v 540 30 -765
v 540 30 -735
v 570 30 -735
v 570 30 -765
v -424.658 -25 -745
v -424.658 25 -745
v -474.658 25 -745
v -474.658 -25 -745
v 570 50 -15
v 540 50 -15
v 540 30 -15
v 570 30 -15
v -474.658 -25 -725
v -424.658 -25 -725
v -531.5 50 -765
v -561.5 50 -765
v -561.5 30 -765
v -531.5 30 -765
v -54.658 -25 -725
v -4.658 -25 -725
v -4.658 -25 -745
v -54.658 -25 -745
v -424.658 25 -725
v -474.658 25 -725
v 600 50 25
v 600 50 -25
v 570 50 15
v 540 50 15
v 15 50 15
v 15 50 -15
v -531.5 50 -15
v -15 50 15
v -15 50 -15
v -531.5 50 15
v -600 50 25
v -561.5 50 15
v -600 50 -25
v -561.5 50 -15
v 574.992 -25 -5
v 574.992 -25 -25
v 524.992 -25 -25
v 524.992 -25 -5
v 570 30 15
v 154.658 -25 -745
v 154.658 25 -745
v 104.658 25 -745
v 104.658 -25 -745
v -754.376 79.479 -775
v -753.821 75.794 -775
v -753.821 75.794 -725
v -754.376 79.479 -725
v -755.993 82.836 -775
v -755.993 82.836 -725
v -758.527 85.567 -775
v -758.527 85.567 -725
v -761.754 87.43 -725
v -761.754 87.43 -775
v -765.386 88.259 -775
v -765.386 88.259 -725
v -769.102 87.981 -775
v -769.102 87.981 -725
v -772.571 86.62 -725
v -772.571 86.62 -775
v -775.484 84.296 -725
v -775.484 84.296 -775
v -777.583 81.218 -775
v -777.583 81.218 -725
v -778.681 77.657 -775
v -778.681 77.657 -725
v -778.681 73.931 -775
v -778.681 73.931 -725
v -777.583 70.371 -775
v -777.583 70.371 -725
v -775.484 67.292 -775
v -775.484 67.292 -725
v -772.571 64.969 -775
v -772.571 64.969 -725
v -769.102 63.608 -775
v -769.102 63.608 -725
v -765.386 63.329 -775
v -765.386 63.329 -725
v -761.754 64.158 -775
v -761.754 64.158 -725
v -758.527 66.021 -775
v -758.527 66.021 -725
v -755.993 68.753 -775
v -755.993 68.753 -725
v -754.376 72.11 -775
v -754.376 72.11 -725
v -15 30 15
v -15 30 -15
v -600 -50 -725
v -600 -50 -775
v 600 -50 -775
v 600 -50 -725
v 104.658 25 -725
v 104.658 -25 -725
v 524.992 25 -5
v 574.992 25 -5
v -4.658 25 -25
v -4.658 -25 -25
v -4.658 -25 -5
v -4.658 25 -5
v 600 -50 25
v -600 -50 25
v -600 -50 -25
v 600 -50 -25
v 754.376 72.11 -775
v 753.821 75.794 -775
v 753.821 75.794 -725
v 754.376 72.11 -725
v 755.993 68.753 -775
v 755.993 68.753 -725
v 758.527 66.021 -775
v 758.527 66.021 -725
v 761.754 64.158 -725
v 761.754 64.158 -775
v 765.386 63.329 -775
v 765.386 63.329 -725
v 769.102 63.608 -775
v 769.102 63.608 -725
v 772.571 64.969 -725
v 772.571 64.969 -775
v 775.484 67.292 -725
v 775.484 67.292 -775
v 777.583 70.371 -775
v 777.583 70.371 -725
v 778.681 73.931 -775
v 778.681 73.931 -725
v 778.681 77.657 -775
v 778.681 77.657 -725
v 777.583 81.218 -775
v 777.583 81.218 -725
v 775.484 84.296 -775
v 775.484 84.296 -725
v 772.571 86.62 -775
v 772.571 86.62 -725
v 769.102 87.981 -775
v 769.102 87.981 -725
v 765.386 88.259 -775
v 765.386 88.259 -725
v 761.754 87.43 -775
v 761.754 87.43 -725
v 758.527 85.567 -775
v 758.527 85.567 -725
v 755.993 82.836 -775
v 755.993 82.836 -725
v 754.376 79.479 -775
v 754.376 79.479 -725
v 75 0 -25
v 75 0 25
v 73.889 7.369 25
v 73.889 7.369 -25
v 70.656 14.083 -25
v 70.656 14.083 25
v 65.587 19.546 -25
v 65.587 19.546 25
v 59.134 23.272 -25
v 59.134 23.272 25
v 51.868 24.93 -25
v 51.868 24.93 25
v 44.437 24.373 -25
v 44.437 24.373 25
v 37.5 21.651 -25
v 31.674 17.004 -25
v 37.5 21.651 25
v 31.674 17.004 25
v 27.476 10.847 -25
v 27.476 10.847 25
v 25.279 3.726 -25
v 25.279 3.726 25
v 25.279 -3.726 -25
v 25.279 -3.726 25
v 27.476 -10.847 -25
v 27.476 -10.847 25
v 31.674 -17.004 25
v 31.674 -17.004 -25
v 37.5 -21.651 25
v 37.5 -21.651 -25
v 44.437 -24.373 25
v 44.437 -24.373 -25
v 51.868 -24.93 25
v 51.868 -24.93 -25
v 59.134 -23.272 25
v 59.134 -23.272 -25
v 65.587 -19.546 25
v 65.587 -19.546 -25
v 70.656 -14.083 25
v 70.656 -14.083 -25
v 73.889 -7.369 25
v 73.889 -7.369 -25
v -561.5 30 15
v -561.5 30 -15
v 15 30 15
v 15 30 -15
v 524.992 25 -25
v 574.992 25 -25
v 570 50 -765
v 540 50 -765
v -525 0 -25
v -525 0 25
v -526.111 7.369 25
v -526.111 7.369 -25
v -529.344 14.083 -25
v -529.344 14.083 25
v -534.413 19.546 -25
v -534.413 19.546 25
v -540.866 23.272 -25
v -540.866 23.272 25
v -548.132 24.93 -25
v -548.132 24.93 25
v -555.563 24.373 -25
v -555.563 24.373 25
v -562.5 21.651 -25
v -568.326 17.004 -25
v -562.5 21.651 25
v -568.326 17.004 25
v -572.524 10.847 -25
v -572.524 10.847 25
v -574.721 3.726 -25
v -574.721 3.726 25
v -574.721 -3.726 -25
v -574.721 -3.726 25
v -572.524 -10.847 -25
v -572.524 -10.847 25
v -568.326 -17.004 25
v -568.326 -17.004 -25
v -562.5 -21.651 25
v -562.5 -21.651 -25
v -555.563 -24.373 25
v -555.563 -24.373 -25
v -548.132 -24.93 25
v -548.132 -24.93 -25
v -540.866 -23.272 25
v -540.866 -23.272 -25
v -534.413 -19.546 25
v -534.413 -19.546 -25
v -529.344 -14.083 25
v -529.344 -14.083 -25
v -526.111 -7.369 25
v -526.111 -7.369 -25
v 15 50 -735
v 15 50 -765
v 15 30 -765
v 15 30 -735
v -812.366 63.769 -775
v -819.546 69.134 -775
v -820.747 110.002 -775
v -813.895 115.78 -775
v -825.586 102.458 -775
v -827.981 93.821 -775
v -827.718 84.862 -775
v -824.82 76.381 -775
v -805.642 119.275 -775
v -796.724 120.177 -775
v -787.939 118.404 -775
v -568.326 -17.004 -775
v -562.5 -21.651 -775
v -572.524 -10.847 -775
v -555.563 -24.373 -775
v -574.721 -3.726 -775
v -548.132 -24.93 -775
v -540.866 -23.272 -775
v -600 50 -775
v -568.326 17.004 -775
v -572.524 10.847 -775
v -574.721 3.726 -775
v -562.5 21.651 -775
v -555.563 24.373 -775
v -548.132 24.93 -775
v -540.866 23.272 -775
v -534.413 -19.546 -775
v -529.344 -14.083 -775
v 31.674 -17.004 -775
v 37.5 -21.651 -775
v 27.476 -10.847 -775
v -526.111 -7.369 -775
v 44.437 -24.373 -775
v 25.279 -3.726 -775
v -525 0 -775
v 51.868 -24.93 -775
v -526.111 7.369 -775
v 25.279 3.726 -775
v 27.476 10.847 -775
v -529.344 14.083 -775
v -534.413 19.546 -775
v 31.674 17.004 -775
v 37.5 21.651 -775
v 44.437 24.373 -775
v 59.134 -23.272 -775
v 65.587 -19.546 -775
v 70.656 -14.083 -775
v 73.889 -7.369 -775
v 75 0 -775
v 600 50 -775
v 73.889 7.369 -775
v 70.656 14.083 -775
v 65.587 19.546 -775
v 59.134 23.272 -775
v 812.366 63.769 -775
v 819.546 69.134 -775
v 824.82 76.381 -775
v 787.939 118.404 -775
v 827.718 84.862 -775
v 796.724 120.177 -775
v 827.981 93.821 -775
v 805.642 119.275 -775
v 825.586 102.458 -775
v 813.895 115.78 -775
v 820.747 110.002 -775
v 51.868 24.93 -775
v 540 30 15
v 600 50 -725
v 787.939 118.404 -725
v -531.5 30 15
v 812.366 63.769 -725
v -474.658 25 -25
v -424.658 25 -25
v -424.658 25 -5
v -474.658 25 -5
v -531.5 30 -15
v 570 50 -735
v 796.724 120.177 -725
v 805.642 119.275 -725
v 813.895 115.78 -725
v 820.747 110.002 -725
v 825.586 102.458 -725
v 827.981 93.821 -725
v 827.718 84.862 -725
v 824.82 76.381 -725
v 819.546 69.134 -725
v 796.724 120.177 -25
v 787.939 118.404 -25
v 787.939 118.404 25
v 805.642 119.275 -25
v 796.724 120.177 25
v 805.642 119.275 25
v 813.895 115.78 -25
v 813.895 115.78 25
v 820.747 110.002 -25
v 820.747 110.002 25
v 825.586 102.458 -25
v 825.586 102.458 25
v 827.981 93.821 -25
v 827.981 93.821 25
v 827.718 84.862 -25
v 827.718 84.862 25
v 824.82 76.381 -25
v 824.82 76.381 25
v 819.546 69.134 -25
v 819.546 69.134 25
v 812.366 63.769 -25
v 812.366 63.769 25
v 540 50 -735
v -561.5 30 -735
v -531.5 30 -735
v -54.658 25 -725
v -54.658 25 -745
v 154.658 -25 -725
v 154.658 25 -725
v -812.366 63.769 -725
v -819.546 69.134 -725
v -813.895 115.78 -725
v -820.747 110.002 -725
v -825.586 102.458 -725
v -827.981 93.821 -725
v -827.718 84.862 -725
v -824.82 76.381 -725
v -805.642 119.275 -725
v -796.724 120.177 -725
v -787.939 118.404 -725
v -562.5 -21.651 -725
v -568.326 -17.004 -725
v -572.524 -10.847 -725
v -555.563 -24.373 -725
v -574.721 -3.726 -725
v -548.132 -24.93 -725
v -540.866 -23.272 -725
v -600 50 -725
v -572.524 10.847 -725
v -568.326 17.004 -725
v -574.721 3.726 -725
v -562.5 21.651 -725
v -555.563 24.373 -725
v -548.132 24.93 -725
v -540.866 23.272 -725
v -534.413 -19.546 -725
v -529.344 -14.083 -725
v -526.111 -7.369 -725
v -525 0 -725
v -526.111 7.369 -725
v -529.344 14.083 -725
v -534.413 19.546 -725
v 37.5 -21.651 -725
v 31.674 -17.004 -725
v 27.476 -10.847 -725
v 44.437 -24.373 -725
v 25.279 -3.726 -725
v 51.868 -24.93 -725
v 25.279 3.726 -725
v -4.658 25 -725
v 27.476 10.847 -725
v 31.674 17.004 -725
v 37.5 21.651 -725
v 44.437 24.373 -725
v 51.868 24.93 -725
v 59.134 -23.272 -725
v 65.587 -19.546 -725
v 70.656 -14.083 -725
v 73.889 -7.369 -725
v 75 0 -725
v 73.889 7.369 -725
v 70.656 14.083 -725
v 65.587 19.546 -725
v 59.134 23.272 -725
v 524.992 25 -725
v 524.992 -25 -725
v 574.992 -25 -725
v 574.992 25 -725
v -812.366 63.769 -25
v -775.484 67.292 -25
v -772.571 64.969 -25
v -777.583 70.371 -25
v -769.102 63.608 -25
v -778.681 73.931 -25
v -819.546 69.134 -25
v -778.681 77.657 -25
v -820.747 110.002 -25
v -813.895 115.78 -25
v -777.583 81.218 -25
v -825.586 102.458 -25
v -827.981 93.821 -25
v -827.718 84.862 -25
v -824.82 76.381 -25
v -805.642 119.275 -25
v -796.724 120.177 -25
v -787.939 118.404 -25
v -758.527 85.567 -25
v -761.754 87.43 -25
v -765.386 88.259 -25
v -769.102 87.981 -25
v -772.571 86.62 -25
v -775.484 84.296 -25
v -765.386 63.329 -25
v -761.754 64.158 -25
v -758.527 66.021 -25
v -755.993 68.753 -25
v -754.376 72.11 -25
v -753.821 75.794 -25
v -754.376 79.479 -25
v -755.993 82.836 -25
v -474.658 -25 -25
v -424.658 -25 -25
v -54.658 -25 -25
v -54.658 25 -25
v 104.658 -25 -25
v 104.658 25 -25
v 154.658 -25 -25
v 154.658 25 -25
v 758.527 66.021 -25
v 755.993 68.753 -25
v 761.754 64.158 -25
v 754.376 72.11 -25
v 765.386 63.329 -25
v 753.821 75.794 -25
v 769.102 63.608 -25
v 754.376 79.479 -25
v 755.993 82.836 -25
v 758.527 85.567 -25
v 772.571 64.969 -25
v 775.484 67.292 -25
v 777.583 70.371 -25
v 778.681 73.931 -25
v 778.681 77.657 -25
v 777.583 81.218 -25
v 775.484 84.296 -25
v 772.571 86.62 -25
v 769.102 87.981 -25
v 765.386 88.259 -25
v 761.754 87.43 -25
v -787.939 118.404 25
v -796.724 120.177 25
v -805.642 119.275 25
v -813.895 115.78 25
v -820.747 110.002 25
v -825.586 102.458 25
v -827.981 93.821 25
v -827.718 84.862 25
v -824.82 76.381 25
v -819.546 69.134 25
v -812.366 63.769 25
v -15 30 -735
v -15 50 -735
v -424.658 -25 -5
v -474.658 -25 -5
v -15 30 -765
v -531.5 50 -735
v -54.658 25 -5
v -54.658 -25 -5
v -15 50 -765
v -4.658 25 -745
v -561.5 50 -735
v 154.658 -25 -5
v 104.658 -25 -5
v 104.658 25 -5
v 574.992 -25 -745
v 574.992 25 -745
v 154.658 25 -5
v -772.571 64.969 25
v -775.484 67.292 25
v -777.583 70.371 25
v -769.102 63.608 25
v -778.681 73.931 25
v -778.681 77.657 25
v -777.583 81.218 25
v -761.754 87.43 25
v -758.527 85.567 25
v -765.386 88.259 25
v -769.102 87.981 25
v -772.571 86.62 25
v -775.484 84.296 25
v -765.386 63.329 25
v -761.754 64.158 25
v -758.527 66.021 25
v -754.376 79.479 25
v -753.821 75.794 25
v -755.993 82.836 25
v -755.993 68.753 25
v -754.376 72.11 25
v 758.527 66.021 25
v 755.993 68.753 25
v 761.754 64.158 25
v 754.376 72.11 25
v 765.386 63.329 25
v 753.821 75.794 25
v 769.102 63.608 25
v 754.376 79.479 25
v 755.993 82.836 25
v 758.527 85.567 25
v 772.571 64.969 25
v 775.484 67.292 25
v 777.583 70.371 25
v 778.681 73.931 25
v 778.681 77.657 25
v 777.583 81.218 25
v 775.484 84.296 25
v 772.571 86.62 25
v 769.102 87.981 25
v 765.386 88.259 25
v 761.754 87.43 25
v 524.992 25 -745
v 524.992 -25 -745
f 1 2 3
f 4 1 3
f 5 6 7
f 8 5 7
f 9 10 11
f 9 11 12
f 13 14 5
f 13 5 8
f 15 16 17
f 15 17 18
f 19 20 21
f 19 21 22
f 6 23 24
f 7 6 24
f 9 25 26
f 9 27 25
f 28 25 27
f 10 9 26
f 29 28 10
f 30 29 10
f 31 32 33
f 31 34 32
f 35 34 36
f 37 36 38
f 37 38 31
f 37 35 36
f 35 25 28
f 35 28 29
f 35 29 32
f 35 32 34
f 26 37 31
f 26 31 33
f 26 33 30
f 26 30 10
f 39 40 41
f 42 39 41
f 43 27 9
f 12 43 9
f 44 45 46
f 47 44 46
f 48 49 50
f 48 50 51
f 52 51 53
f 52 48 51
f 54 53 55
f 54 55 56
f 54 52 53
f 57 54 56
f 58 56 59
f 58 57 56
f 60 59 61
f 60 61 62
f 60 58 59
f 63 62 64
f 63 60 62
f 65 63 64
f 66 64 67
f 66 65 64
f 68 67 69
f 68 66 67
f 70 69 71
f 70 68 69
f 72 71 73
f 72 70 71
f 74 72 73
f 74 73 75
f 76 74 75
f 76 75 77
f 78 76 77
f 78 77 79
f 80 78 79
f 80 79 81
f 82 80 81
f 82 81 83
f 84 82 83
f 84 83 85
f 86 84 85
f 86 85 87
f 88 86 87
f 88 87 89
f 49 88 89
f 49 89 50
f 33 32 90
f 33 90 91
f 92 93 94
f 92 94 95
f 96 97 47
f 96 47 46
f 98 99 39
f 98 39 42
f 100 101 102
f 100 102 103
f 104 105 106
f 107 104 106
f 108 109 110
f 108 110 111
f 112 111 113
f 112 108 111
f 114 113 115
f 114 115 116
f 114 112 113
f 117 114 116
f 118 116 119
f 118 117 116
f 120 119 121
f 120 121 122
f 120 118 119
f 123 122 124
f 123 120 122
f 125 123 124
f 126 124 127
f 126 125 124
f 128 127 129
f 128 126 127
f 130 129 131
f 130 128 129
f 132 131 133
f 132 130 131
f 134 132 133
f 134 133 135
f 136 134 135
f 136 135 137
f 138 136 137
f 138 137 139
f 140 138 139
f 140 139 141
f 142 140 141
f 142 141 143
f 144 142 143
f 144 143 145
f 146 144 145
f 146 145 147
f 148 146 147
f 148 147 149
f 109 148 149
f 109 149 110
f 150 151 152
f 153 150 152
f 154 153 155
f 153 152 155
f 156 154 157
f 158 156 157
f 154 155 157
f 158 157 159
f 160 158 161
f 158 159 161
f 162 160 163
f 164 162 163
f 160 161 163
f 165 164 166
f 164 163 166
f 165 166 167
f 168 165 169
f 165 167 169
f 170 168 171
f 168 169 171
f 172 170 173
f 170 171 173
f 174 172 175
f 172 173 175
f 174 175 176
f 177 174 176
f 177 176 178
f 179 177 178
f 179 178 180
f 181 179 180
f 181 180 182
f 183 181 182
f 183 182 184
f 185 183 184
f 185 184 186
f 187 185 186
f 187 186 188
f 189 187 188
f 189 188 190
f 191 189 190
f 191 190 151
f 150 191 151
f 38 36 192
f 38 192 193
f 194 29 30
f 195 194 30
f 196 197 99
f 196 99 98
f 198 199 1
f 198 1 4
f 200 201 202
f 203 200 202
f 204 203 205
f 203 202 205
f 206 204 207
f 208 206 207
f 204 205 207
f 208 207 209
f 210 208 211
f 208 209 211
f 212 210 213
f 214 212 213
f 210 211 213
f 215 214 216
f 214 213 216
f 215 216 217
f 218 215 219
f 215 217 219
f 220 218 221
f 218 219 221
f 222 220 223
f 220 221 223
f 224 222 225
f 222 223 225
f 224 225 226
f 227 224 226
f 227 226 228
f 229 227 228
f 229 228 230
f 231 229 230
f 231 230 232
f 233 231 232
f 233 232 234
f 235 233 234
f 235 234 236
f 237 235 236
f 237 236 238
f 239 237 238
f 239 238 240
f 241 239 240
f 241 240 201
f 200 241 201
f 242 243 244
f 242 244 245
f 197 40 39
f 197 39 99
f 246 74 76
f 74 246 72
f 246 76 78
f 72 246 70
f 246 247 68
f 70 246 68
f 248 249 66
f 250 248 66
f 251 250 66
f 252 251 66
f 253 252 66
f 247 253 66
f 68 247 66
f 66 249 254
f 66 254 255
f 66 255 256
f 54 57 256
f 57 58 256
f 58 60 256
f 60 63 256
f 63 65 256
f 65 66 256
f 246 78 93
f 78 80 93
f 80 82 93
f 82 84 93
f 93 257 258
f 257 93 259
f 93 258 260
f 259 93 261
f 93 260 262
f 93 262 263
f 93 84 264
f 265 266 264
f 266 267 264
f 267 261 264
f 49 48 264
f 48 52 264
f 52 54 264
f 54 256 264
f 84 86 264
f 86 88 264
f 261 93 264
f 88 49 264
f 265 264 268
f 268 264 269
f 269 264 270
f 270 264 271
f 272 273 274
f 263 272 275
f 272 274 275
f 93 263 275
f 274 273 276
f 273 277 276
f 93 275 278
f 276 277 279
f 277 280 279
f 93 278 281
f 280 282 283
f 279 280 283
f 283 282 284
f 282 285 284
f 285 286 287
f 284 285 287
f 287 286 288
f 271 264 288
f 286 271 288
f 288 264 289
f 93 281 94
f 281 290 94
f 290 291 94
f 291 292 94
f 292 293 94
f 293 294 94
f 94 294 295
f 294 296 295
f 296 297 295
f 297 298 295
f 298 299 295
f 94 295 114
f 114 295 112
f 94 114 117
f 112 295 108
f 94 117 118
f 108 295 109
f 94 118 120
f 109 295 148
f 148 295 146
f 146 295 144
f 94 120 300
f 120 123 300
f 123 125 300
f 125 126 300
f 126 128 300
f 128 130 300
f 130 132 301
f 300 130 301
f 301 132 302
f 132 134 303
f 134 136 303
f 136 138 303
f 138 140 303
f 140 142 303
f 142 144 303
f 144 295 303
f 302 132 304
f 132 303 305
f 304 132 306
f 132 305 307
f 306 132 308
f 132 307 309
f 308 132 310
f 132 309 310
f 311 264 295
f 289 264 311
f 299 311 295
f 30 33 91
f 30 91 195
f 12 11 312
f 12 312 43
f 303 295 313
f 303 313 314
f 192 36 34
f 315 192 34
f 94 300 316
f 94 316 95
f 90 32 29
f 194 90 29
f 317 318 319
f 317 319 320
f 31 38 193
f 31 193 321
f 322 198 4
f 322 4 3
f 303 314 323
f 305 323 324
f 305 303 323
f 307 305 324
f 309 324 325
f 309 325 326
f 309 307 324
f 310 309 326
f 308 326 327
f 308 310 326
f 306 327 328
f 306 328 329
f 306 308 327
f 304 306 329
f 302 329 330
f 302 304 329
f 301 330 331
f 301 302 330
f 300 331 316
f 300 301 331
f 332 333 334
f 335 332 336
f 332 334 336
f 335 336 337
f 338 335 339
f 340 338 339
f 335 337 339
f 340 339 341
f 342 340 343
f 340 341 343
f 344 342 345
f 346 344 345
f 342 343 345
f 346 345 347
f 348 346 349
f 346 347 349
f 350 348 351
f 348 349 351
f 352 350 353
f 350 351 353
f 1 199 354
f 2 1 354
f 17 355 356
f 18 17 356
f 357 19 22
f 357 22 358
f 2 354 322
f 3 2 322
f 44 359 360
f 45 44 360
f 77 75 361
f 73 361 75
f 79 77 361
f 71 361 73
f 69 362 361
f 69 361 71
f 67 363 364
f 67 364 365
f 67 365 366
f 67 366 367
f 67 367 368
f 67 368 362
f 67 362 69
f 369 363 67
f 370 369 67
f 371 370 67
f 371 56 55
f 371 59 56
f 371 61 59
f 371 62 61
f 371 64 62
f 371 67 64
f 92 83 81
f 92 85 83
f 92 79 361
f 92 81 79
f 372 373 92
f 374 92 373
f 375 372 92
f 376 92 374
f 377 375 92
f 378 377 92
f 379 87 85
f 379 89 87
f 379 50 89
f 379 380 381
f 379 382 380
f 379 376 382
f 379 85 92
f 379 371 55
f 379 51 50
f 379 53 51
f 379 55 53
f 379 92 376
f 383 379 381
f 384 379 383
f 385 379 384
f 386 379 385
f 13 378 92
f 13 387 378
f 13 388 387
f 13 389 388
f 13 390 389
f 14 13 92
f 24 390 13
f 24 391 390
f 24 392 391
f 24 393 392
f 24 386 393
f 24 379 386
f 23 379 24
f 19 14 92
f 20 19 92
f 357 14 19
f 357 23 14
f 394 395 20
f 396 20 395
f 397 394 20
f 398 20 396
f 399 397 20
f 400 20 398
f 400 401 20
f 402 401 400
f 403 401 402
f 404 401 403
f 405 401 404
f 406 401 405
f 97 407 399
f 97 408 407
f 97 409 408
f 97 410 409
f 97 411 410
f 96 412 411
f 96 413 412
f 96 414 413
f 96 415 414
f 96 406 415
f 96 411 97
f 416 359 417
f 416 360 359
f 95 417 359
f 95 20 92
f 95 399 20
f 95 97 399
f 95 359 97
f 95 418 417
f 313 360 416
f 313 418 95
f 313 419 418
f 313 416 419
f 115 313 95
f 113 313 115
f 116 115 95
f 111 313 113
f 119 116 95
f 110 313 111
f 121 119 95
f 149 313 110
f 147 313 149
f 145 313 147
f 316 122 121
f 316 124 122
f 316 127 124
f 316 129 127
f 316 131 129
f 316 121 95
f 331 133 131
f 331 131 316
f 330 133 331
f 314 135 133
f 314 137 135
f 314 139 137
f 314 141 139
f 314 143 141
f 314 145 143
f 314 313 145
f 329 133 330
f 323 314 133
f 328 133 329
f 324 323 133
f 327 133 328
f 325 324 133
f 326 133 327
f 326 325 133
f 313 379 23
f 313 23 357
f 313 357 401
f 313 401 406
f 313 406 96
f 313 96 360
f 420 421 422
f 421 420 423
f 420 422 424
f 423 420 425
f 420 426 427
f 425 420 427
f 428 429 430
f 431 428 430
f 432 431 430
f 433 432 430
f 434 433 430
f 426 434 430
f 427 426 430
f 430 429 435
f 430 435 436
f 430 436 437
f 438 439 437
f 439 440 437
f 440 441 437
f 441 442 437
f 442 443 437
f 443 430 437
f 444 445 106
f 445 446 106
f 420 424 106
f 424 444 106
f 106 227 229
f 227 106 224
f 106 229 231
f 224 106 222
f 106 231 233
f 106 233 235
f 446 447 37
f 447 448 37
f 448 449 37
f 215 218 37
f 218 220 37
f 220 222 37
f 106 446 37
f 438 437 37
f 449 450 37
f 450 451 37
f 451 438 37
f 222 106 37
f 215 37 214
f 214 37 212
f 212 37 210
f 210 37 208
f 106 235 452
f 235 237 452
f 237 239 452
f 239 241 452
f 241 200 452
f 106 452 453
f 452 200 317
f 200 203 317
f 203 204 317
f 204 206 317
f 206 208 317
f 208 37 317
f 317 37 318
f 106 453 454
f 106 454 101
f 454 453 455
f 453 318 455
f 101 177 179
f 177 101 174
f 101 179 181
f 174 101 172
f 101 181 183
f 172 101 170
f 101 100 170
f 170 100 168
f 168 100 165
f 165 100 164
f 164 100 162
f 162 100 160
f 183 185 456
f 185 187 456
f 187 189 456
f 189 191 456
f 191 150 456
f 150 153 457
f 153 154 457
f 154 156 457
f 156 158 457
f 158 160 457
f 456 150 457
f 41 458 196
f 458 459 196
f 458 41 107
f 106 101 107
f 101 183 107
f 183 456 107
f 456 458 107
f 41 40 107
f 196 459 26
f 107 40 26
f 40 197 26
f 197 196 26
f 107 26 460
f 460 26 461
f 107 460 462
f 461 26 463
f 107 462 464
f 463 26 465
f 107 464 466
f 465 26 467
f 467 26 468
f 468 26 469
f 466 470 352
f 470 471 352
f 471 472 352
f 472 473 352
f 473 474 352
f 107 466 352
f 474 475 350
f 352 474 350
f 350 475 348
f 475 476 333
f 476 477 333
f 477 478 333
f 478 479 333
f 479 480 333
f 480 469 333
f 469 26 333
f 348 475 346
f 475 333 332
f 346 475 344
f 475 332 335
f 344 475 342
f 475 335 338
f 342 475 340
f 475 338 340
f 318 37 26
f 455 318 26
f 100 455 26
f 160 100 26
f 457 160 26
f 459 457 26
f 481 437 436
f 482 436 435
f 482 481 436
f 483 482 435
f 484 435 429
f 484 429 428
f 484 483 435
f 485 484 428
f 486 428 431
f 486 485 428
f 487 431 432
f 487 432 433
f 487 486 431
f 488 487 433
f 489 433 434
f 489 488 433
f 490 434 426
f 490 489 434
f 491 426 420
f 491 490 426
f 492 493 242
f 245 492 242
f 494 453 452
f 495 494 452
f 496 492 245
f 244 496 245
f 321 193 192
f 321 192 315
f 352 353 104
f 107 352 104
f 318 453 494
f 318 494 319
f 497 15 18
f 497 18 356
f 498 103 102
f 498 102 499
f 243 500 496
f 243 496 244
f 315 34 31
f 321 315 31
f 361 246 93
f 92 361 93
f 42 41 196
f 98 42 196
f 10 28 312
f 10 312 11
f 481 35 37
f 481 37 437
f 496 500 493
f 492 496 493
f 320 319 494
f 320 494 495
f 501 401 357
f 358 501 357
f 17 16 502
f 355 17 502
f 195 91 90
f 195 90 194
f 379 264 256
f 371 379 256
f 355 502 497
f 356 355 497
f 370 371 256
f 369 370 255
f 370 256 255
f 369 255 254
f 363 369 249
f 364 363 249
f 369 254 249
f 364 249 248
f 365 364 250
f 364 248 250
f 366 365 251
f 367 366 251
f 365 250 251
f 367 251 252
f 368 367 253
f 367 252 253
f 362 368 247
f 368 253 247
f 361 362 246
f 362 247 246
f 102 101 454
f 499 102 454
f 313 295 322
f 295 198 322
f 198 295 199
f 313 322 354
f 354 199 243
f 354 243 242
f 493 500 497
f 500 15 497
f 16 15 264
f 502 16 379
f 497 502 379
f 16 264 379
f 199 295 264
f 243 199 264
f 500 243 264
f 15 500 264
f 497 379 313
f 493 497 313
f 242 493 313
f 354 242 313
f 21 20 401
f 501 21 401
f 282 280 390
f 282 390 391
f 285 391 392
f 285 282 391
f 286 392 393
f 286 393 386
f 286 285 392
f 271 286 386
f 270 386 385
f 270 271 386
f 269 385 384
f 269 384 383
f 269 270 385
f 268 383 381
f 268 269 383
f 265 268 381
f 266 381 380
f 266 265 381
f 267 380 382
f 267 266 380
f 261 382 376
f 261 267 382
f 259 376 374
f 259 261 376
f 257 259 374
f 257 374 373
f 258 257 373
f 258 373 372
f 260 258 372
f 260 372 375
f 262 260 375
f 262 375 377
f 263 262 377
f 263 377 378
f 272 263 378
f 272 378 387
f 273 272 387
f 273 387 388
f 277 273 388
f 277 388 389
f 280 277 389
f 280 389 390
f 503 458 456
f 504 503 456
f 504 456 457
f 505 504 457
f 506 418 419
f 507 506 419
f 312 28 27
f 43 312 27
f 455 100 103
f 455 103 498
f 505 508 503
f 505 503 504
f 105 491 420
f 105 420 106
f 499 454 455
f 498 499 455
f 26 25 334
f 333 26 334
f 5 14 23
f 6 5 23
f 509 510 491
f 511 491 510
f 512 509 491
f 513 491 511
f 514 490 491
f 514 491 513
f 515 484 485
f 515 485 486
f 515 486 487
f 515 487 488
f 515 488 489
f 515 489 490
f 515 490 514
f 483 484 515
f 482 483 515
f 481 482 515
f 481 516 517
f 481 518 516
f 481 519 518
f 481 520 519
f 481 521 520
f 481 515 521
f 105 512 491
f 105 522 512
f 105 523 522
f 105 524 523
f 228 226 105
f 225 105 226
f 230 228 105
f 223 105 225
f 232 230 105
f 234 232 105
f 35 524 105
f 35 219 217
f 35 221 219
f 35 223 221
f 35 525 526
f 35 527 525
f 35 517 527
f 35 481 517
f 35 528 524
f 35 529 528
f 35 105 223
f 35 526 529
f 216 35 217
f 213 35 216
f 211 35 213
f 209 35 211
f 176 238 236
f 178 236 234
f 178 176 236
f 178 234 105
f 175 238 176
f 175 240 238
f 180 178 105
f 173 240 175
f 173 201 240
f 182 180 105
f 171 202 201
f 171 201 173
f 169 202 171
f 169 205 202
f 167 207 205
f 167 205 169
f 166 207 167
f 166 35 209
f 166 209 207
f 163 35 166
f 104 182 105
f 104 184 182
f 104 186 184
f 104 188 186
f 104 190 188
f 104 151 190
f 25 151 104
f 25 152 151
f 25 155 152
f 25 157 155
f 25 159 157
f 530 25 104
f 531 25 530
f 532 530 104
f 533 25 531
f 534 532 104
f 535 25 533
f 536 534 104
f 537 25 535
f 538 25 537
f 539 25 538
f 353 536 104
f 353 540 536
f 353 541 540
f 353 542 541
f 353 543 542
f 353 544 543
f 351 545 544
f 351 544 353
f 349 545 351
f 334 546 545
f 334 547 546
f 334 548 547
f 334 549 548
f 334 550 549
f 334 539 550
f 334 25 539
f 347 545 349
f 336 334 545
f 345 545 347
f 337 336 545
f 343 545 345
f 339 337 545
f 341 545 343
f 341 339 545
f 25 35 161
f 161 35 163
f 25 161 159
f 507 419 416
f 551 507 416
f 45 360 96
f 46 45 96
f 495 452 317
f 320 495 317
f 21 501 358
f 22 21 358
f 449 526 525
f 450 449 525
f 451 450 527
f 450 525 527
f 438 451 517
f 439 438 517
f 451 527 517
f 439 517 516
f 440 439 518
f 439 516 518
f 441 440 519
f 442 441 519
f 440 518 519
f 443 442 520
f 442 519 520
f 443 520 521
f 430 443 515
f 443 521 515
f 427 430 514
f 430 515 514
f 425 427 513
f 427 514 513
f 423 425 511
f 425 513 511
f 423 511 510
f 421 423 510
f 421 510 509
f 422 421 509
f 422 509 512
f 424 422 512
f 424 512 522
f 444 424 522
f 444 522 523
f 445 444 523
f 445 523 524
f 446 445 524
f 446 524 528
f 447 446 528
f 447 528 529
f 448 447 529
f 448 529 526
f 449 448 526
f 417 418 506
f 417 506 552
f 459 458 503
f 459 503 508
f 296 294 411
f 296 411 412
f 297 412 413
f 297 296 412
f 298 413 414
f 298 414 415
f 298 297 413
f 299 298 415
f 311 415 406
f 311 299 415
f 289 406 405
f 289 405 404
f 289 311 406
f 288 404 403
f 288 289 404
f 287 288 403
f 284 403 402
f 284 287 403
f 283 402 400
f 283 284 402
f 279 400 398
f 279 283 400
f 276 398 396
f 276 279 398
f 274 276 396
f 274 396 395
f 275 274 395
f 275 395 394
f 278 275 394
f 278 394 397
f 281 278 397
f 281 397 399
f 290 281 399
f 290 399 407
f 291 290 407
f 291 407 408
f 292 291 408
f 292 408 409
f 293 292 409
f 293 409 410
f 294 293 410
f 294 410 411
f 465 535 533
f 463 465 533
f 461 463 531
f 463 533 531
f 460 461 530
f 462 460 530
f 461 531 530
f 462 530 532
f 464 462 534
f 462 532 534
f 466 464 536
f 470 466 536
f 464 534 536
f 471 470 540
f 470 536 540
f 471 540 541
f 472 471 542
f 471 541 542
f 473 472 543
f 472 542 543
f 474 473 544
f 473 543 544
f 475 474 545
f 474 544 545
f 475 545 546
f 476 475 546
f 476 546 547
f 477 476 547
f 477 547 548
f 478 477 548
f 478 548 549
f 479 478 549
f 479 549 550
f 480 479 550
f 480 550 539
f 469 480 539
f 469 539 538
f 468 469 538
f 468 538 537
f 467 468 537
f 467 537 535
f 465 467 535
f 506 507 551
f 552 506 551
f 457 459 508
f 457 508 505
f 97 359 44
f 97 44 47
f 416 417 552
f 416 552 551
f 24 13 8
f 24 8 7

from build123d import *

# Parameters (mm, degrees)
BOSS_EXTRUDE3_DEPTH      = 600
BOSS_EXTRUDE3_DEPTH_BACK = 600
SKETCH1_W                = 50
SKETCH1_H                = 100
BOSS_EXTRUDE4_DEPTH      = 50
SKETCH4_R                = 25
SKETCH4_R_2              = 12.5
CUT_EXTRUDE1_DEPTH       = 839.37045622
SKETCH5_W                = 50
SKETCH5_H                = 50
CUT_EXTRUDE2_DEPTH       = 20
SKETCH7_W                = 30
SKETCH7_H                = 30
CUT_EXTRUDE3_DEPTH       = 20


with BuildPart() as part:
    # Sketch1 → Boss-Extrude3 (new, two sides: drawn at the far end of the back side and taken through both)
    with BuildSketch(Plane(origin=(0, 0, 0), x_dir=(0, 0, -1), z_dir=(1, 0, 0)).offset(-BOSS_EXTRUDE3_DEPTH_BACK)):
        Rectangle(SKETCH1_W, SKETCH1_H)
    extrude(amount=BOSS_EXTRUDE3_DEPTH + BOSS_EXTRUDE3_DEPTH_BACK)

    # Sketch3 → Boss-Extrude4 (add)
    with BuildSketch(Plane.XY.offset(25)):
        with BuildLine():
            Line((600, 50), (787.938524157, 118.404028665))
            ThreePointArc((787.938524157, 118.404028665), (825.586409015, 102.458120952), (812.365913421, 63.768927328))
            Line((812.365913421, 63.768927328), (600, -50))
            Line((600, -50), (600, 50))
        make_face()
    boss_extrude4 = extrude(amount=-BOSS_EXTRUDE4_DEPTH)

    # Mirror1: Boss-Extrude4 across plane
    add(boss_extrude4.mirror(Plane(origin=(0, 0, 0), x_dir=(0, 0, 1), z_dir=(1, 0, 0))))

    # Sketch4 → Cut-Extrude1 (cut, through all)
    with BuildSketch(Plane.XY.offset(25)):
        with Locations((-550, 0)):
            Circle(SKETCH4_R)
        with Locations((50, 0)):
            Circle(SKETCH4_R)
        with Locations((766.320606962, 75.79432784)):
            Circle(SKETCH4_R_2)
        with Locations((-766.320606962, 75.79432784)):
            Circle(SKETCH4_R_2)
    extrude(amount=-CUT_EXTRUDE1_DEPTH, mode=Mode.SUBTRACT)

    # Sketch5 → Cut-Extrude2 (cut)
    with BuildSketch(Plane(origin=(0, 0, -25), x_dir=(-1, 0, 0), z_dir=(0, 0, -1))):
        with Locations((449.657658347, 0)):
            Rectangle(SKETCH5_W, SKETCH5_H)
        with Locations((29.657658347, 0)):
            Rectangle(SKETCH5_W, SKETCH5_H)
        with Locations((-549.992341653, 0)):
            Rectangle(SKETCH5_W, SKETCH5_H)
        with Locations((-129.657658347, 0)):
            Rectangle(SKETCH5_W, SKETCH5_H)
    extrude(amount=-CUT_EXTRUDE2_DEPTH, mode=Mode.SUBTRACT)

    # Sketch7 → Cut-Extrude3 (cut)
    with BuildSketch(Plane(origin=(0, 50, 0), x_dir=(1, 0, 0), z_dir=(0, 1, 0))):
        with Locations((-546.5, 0)):
            Rectangle(SKETCH7_W, SKETCH7_H)
        Rectangle(SKETCH7_W, SKETCH7_H)
        with Locations((555, 0)):
            Rectangle(SKETCH7_W, SKETCH7_H)
    extrude(amount=-CUT_EXTRUDE3_DEPTH, mode=Mode.SUBTRACT)


with BuildPart() as body_2:
    # Mirror4: mirrored copy
    add(part.part.mirror(Plane(origin=(0, 0, -375), x_dir=(1, 0, 0), z_dir=(0, 0, -1))))


solid = Compound([part.part, body_2.part])
